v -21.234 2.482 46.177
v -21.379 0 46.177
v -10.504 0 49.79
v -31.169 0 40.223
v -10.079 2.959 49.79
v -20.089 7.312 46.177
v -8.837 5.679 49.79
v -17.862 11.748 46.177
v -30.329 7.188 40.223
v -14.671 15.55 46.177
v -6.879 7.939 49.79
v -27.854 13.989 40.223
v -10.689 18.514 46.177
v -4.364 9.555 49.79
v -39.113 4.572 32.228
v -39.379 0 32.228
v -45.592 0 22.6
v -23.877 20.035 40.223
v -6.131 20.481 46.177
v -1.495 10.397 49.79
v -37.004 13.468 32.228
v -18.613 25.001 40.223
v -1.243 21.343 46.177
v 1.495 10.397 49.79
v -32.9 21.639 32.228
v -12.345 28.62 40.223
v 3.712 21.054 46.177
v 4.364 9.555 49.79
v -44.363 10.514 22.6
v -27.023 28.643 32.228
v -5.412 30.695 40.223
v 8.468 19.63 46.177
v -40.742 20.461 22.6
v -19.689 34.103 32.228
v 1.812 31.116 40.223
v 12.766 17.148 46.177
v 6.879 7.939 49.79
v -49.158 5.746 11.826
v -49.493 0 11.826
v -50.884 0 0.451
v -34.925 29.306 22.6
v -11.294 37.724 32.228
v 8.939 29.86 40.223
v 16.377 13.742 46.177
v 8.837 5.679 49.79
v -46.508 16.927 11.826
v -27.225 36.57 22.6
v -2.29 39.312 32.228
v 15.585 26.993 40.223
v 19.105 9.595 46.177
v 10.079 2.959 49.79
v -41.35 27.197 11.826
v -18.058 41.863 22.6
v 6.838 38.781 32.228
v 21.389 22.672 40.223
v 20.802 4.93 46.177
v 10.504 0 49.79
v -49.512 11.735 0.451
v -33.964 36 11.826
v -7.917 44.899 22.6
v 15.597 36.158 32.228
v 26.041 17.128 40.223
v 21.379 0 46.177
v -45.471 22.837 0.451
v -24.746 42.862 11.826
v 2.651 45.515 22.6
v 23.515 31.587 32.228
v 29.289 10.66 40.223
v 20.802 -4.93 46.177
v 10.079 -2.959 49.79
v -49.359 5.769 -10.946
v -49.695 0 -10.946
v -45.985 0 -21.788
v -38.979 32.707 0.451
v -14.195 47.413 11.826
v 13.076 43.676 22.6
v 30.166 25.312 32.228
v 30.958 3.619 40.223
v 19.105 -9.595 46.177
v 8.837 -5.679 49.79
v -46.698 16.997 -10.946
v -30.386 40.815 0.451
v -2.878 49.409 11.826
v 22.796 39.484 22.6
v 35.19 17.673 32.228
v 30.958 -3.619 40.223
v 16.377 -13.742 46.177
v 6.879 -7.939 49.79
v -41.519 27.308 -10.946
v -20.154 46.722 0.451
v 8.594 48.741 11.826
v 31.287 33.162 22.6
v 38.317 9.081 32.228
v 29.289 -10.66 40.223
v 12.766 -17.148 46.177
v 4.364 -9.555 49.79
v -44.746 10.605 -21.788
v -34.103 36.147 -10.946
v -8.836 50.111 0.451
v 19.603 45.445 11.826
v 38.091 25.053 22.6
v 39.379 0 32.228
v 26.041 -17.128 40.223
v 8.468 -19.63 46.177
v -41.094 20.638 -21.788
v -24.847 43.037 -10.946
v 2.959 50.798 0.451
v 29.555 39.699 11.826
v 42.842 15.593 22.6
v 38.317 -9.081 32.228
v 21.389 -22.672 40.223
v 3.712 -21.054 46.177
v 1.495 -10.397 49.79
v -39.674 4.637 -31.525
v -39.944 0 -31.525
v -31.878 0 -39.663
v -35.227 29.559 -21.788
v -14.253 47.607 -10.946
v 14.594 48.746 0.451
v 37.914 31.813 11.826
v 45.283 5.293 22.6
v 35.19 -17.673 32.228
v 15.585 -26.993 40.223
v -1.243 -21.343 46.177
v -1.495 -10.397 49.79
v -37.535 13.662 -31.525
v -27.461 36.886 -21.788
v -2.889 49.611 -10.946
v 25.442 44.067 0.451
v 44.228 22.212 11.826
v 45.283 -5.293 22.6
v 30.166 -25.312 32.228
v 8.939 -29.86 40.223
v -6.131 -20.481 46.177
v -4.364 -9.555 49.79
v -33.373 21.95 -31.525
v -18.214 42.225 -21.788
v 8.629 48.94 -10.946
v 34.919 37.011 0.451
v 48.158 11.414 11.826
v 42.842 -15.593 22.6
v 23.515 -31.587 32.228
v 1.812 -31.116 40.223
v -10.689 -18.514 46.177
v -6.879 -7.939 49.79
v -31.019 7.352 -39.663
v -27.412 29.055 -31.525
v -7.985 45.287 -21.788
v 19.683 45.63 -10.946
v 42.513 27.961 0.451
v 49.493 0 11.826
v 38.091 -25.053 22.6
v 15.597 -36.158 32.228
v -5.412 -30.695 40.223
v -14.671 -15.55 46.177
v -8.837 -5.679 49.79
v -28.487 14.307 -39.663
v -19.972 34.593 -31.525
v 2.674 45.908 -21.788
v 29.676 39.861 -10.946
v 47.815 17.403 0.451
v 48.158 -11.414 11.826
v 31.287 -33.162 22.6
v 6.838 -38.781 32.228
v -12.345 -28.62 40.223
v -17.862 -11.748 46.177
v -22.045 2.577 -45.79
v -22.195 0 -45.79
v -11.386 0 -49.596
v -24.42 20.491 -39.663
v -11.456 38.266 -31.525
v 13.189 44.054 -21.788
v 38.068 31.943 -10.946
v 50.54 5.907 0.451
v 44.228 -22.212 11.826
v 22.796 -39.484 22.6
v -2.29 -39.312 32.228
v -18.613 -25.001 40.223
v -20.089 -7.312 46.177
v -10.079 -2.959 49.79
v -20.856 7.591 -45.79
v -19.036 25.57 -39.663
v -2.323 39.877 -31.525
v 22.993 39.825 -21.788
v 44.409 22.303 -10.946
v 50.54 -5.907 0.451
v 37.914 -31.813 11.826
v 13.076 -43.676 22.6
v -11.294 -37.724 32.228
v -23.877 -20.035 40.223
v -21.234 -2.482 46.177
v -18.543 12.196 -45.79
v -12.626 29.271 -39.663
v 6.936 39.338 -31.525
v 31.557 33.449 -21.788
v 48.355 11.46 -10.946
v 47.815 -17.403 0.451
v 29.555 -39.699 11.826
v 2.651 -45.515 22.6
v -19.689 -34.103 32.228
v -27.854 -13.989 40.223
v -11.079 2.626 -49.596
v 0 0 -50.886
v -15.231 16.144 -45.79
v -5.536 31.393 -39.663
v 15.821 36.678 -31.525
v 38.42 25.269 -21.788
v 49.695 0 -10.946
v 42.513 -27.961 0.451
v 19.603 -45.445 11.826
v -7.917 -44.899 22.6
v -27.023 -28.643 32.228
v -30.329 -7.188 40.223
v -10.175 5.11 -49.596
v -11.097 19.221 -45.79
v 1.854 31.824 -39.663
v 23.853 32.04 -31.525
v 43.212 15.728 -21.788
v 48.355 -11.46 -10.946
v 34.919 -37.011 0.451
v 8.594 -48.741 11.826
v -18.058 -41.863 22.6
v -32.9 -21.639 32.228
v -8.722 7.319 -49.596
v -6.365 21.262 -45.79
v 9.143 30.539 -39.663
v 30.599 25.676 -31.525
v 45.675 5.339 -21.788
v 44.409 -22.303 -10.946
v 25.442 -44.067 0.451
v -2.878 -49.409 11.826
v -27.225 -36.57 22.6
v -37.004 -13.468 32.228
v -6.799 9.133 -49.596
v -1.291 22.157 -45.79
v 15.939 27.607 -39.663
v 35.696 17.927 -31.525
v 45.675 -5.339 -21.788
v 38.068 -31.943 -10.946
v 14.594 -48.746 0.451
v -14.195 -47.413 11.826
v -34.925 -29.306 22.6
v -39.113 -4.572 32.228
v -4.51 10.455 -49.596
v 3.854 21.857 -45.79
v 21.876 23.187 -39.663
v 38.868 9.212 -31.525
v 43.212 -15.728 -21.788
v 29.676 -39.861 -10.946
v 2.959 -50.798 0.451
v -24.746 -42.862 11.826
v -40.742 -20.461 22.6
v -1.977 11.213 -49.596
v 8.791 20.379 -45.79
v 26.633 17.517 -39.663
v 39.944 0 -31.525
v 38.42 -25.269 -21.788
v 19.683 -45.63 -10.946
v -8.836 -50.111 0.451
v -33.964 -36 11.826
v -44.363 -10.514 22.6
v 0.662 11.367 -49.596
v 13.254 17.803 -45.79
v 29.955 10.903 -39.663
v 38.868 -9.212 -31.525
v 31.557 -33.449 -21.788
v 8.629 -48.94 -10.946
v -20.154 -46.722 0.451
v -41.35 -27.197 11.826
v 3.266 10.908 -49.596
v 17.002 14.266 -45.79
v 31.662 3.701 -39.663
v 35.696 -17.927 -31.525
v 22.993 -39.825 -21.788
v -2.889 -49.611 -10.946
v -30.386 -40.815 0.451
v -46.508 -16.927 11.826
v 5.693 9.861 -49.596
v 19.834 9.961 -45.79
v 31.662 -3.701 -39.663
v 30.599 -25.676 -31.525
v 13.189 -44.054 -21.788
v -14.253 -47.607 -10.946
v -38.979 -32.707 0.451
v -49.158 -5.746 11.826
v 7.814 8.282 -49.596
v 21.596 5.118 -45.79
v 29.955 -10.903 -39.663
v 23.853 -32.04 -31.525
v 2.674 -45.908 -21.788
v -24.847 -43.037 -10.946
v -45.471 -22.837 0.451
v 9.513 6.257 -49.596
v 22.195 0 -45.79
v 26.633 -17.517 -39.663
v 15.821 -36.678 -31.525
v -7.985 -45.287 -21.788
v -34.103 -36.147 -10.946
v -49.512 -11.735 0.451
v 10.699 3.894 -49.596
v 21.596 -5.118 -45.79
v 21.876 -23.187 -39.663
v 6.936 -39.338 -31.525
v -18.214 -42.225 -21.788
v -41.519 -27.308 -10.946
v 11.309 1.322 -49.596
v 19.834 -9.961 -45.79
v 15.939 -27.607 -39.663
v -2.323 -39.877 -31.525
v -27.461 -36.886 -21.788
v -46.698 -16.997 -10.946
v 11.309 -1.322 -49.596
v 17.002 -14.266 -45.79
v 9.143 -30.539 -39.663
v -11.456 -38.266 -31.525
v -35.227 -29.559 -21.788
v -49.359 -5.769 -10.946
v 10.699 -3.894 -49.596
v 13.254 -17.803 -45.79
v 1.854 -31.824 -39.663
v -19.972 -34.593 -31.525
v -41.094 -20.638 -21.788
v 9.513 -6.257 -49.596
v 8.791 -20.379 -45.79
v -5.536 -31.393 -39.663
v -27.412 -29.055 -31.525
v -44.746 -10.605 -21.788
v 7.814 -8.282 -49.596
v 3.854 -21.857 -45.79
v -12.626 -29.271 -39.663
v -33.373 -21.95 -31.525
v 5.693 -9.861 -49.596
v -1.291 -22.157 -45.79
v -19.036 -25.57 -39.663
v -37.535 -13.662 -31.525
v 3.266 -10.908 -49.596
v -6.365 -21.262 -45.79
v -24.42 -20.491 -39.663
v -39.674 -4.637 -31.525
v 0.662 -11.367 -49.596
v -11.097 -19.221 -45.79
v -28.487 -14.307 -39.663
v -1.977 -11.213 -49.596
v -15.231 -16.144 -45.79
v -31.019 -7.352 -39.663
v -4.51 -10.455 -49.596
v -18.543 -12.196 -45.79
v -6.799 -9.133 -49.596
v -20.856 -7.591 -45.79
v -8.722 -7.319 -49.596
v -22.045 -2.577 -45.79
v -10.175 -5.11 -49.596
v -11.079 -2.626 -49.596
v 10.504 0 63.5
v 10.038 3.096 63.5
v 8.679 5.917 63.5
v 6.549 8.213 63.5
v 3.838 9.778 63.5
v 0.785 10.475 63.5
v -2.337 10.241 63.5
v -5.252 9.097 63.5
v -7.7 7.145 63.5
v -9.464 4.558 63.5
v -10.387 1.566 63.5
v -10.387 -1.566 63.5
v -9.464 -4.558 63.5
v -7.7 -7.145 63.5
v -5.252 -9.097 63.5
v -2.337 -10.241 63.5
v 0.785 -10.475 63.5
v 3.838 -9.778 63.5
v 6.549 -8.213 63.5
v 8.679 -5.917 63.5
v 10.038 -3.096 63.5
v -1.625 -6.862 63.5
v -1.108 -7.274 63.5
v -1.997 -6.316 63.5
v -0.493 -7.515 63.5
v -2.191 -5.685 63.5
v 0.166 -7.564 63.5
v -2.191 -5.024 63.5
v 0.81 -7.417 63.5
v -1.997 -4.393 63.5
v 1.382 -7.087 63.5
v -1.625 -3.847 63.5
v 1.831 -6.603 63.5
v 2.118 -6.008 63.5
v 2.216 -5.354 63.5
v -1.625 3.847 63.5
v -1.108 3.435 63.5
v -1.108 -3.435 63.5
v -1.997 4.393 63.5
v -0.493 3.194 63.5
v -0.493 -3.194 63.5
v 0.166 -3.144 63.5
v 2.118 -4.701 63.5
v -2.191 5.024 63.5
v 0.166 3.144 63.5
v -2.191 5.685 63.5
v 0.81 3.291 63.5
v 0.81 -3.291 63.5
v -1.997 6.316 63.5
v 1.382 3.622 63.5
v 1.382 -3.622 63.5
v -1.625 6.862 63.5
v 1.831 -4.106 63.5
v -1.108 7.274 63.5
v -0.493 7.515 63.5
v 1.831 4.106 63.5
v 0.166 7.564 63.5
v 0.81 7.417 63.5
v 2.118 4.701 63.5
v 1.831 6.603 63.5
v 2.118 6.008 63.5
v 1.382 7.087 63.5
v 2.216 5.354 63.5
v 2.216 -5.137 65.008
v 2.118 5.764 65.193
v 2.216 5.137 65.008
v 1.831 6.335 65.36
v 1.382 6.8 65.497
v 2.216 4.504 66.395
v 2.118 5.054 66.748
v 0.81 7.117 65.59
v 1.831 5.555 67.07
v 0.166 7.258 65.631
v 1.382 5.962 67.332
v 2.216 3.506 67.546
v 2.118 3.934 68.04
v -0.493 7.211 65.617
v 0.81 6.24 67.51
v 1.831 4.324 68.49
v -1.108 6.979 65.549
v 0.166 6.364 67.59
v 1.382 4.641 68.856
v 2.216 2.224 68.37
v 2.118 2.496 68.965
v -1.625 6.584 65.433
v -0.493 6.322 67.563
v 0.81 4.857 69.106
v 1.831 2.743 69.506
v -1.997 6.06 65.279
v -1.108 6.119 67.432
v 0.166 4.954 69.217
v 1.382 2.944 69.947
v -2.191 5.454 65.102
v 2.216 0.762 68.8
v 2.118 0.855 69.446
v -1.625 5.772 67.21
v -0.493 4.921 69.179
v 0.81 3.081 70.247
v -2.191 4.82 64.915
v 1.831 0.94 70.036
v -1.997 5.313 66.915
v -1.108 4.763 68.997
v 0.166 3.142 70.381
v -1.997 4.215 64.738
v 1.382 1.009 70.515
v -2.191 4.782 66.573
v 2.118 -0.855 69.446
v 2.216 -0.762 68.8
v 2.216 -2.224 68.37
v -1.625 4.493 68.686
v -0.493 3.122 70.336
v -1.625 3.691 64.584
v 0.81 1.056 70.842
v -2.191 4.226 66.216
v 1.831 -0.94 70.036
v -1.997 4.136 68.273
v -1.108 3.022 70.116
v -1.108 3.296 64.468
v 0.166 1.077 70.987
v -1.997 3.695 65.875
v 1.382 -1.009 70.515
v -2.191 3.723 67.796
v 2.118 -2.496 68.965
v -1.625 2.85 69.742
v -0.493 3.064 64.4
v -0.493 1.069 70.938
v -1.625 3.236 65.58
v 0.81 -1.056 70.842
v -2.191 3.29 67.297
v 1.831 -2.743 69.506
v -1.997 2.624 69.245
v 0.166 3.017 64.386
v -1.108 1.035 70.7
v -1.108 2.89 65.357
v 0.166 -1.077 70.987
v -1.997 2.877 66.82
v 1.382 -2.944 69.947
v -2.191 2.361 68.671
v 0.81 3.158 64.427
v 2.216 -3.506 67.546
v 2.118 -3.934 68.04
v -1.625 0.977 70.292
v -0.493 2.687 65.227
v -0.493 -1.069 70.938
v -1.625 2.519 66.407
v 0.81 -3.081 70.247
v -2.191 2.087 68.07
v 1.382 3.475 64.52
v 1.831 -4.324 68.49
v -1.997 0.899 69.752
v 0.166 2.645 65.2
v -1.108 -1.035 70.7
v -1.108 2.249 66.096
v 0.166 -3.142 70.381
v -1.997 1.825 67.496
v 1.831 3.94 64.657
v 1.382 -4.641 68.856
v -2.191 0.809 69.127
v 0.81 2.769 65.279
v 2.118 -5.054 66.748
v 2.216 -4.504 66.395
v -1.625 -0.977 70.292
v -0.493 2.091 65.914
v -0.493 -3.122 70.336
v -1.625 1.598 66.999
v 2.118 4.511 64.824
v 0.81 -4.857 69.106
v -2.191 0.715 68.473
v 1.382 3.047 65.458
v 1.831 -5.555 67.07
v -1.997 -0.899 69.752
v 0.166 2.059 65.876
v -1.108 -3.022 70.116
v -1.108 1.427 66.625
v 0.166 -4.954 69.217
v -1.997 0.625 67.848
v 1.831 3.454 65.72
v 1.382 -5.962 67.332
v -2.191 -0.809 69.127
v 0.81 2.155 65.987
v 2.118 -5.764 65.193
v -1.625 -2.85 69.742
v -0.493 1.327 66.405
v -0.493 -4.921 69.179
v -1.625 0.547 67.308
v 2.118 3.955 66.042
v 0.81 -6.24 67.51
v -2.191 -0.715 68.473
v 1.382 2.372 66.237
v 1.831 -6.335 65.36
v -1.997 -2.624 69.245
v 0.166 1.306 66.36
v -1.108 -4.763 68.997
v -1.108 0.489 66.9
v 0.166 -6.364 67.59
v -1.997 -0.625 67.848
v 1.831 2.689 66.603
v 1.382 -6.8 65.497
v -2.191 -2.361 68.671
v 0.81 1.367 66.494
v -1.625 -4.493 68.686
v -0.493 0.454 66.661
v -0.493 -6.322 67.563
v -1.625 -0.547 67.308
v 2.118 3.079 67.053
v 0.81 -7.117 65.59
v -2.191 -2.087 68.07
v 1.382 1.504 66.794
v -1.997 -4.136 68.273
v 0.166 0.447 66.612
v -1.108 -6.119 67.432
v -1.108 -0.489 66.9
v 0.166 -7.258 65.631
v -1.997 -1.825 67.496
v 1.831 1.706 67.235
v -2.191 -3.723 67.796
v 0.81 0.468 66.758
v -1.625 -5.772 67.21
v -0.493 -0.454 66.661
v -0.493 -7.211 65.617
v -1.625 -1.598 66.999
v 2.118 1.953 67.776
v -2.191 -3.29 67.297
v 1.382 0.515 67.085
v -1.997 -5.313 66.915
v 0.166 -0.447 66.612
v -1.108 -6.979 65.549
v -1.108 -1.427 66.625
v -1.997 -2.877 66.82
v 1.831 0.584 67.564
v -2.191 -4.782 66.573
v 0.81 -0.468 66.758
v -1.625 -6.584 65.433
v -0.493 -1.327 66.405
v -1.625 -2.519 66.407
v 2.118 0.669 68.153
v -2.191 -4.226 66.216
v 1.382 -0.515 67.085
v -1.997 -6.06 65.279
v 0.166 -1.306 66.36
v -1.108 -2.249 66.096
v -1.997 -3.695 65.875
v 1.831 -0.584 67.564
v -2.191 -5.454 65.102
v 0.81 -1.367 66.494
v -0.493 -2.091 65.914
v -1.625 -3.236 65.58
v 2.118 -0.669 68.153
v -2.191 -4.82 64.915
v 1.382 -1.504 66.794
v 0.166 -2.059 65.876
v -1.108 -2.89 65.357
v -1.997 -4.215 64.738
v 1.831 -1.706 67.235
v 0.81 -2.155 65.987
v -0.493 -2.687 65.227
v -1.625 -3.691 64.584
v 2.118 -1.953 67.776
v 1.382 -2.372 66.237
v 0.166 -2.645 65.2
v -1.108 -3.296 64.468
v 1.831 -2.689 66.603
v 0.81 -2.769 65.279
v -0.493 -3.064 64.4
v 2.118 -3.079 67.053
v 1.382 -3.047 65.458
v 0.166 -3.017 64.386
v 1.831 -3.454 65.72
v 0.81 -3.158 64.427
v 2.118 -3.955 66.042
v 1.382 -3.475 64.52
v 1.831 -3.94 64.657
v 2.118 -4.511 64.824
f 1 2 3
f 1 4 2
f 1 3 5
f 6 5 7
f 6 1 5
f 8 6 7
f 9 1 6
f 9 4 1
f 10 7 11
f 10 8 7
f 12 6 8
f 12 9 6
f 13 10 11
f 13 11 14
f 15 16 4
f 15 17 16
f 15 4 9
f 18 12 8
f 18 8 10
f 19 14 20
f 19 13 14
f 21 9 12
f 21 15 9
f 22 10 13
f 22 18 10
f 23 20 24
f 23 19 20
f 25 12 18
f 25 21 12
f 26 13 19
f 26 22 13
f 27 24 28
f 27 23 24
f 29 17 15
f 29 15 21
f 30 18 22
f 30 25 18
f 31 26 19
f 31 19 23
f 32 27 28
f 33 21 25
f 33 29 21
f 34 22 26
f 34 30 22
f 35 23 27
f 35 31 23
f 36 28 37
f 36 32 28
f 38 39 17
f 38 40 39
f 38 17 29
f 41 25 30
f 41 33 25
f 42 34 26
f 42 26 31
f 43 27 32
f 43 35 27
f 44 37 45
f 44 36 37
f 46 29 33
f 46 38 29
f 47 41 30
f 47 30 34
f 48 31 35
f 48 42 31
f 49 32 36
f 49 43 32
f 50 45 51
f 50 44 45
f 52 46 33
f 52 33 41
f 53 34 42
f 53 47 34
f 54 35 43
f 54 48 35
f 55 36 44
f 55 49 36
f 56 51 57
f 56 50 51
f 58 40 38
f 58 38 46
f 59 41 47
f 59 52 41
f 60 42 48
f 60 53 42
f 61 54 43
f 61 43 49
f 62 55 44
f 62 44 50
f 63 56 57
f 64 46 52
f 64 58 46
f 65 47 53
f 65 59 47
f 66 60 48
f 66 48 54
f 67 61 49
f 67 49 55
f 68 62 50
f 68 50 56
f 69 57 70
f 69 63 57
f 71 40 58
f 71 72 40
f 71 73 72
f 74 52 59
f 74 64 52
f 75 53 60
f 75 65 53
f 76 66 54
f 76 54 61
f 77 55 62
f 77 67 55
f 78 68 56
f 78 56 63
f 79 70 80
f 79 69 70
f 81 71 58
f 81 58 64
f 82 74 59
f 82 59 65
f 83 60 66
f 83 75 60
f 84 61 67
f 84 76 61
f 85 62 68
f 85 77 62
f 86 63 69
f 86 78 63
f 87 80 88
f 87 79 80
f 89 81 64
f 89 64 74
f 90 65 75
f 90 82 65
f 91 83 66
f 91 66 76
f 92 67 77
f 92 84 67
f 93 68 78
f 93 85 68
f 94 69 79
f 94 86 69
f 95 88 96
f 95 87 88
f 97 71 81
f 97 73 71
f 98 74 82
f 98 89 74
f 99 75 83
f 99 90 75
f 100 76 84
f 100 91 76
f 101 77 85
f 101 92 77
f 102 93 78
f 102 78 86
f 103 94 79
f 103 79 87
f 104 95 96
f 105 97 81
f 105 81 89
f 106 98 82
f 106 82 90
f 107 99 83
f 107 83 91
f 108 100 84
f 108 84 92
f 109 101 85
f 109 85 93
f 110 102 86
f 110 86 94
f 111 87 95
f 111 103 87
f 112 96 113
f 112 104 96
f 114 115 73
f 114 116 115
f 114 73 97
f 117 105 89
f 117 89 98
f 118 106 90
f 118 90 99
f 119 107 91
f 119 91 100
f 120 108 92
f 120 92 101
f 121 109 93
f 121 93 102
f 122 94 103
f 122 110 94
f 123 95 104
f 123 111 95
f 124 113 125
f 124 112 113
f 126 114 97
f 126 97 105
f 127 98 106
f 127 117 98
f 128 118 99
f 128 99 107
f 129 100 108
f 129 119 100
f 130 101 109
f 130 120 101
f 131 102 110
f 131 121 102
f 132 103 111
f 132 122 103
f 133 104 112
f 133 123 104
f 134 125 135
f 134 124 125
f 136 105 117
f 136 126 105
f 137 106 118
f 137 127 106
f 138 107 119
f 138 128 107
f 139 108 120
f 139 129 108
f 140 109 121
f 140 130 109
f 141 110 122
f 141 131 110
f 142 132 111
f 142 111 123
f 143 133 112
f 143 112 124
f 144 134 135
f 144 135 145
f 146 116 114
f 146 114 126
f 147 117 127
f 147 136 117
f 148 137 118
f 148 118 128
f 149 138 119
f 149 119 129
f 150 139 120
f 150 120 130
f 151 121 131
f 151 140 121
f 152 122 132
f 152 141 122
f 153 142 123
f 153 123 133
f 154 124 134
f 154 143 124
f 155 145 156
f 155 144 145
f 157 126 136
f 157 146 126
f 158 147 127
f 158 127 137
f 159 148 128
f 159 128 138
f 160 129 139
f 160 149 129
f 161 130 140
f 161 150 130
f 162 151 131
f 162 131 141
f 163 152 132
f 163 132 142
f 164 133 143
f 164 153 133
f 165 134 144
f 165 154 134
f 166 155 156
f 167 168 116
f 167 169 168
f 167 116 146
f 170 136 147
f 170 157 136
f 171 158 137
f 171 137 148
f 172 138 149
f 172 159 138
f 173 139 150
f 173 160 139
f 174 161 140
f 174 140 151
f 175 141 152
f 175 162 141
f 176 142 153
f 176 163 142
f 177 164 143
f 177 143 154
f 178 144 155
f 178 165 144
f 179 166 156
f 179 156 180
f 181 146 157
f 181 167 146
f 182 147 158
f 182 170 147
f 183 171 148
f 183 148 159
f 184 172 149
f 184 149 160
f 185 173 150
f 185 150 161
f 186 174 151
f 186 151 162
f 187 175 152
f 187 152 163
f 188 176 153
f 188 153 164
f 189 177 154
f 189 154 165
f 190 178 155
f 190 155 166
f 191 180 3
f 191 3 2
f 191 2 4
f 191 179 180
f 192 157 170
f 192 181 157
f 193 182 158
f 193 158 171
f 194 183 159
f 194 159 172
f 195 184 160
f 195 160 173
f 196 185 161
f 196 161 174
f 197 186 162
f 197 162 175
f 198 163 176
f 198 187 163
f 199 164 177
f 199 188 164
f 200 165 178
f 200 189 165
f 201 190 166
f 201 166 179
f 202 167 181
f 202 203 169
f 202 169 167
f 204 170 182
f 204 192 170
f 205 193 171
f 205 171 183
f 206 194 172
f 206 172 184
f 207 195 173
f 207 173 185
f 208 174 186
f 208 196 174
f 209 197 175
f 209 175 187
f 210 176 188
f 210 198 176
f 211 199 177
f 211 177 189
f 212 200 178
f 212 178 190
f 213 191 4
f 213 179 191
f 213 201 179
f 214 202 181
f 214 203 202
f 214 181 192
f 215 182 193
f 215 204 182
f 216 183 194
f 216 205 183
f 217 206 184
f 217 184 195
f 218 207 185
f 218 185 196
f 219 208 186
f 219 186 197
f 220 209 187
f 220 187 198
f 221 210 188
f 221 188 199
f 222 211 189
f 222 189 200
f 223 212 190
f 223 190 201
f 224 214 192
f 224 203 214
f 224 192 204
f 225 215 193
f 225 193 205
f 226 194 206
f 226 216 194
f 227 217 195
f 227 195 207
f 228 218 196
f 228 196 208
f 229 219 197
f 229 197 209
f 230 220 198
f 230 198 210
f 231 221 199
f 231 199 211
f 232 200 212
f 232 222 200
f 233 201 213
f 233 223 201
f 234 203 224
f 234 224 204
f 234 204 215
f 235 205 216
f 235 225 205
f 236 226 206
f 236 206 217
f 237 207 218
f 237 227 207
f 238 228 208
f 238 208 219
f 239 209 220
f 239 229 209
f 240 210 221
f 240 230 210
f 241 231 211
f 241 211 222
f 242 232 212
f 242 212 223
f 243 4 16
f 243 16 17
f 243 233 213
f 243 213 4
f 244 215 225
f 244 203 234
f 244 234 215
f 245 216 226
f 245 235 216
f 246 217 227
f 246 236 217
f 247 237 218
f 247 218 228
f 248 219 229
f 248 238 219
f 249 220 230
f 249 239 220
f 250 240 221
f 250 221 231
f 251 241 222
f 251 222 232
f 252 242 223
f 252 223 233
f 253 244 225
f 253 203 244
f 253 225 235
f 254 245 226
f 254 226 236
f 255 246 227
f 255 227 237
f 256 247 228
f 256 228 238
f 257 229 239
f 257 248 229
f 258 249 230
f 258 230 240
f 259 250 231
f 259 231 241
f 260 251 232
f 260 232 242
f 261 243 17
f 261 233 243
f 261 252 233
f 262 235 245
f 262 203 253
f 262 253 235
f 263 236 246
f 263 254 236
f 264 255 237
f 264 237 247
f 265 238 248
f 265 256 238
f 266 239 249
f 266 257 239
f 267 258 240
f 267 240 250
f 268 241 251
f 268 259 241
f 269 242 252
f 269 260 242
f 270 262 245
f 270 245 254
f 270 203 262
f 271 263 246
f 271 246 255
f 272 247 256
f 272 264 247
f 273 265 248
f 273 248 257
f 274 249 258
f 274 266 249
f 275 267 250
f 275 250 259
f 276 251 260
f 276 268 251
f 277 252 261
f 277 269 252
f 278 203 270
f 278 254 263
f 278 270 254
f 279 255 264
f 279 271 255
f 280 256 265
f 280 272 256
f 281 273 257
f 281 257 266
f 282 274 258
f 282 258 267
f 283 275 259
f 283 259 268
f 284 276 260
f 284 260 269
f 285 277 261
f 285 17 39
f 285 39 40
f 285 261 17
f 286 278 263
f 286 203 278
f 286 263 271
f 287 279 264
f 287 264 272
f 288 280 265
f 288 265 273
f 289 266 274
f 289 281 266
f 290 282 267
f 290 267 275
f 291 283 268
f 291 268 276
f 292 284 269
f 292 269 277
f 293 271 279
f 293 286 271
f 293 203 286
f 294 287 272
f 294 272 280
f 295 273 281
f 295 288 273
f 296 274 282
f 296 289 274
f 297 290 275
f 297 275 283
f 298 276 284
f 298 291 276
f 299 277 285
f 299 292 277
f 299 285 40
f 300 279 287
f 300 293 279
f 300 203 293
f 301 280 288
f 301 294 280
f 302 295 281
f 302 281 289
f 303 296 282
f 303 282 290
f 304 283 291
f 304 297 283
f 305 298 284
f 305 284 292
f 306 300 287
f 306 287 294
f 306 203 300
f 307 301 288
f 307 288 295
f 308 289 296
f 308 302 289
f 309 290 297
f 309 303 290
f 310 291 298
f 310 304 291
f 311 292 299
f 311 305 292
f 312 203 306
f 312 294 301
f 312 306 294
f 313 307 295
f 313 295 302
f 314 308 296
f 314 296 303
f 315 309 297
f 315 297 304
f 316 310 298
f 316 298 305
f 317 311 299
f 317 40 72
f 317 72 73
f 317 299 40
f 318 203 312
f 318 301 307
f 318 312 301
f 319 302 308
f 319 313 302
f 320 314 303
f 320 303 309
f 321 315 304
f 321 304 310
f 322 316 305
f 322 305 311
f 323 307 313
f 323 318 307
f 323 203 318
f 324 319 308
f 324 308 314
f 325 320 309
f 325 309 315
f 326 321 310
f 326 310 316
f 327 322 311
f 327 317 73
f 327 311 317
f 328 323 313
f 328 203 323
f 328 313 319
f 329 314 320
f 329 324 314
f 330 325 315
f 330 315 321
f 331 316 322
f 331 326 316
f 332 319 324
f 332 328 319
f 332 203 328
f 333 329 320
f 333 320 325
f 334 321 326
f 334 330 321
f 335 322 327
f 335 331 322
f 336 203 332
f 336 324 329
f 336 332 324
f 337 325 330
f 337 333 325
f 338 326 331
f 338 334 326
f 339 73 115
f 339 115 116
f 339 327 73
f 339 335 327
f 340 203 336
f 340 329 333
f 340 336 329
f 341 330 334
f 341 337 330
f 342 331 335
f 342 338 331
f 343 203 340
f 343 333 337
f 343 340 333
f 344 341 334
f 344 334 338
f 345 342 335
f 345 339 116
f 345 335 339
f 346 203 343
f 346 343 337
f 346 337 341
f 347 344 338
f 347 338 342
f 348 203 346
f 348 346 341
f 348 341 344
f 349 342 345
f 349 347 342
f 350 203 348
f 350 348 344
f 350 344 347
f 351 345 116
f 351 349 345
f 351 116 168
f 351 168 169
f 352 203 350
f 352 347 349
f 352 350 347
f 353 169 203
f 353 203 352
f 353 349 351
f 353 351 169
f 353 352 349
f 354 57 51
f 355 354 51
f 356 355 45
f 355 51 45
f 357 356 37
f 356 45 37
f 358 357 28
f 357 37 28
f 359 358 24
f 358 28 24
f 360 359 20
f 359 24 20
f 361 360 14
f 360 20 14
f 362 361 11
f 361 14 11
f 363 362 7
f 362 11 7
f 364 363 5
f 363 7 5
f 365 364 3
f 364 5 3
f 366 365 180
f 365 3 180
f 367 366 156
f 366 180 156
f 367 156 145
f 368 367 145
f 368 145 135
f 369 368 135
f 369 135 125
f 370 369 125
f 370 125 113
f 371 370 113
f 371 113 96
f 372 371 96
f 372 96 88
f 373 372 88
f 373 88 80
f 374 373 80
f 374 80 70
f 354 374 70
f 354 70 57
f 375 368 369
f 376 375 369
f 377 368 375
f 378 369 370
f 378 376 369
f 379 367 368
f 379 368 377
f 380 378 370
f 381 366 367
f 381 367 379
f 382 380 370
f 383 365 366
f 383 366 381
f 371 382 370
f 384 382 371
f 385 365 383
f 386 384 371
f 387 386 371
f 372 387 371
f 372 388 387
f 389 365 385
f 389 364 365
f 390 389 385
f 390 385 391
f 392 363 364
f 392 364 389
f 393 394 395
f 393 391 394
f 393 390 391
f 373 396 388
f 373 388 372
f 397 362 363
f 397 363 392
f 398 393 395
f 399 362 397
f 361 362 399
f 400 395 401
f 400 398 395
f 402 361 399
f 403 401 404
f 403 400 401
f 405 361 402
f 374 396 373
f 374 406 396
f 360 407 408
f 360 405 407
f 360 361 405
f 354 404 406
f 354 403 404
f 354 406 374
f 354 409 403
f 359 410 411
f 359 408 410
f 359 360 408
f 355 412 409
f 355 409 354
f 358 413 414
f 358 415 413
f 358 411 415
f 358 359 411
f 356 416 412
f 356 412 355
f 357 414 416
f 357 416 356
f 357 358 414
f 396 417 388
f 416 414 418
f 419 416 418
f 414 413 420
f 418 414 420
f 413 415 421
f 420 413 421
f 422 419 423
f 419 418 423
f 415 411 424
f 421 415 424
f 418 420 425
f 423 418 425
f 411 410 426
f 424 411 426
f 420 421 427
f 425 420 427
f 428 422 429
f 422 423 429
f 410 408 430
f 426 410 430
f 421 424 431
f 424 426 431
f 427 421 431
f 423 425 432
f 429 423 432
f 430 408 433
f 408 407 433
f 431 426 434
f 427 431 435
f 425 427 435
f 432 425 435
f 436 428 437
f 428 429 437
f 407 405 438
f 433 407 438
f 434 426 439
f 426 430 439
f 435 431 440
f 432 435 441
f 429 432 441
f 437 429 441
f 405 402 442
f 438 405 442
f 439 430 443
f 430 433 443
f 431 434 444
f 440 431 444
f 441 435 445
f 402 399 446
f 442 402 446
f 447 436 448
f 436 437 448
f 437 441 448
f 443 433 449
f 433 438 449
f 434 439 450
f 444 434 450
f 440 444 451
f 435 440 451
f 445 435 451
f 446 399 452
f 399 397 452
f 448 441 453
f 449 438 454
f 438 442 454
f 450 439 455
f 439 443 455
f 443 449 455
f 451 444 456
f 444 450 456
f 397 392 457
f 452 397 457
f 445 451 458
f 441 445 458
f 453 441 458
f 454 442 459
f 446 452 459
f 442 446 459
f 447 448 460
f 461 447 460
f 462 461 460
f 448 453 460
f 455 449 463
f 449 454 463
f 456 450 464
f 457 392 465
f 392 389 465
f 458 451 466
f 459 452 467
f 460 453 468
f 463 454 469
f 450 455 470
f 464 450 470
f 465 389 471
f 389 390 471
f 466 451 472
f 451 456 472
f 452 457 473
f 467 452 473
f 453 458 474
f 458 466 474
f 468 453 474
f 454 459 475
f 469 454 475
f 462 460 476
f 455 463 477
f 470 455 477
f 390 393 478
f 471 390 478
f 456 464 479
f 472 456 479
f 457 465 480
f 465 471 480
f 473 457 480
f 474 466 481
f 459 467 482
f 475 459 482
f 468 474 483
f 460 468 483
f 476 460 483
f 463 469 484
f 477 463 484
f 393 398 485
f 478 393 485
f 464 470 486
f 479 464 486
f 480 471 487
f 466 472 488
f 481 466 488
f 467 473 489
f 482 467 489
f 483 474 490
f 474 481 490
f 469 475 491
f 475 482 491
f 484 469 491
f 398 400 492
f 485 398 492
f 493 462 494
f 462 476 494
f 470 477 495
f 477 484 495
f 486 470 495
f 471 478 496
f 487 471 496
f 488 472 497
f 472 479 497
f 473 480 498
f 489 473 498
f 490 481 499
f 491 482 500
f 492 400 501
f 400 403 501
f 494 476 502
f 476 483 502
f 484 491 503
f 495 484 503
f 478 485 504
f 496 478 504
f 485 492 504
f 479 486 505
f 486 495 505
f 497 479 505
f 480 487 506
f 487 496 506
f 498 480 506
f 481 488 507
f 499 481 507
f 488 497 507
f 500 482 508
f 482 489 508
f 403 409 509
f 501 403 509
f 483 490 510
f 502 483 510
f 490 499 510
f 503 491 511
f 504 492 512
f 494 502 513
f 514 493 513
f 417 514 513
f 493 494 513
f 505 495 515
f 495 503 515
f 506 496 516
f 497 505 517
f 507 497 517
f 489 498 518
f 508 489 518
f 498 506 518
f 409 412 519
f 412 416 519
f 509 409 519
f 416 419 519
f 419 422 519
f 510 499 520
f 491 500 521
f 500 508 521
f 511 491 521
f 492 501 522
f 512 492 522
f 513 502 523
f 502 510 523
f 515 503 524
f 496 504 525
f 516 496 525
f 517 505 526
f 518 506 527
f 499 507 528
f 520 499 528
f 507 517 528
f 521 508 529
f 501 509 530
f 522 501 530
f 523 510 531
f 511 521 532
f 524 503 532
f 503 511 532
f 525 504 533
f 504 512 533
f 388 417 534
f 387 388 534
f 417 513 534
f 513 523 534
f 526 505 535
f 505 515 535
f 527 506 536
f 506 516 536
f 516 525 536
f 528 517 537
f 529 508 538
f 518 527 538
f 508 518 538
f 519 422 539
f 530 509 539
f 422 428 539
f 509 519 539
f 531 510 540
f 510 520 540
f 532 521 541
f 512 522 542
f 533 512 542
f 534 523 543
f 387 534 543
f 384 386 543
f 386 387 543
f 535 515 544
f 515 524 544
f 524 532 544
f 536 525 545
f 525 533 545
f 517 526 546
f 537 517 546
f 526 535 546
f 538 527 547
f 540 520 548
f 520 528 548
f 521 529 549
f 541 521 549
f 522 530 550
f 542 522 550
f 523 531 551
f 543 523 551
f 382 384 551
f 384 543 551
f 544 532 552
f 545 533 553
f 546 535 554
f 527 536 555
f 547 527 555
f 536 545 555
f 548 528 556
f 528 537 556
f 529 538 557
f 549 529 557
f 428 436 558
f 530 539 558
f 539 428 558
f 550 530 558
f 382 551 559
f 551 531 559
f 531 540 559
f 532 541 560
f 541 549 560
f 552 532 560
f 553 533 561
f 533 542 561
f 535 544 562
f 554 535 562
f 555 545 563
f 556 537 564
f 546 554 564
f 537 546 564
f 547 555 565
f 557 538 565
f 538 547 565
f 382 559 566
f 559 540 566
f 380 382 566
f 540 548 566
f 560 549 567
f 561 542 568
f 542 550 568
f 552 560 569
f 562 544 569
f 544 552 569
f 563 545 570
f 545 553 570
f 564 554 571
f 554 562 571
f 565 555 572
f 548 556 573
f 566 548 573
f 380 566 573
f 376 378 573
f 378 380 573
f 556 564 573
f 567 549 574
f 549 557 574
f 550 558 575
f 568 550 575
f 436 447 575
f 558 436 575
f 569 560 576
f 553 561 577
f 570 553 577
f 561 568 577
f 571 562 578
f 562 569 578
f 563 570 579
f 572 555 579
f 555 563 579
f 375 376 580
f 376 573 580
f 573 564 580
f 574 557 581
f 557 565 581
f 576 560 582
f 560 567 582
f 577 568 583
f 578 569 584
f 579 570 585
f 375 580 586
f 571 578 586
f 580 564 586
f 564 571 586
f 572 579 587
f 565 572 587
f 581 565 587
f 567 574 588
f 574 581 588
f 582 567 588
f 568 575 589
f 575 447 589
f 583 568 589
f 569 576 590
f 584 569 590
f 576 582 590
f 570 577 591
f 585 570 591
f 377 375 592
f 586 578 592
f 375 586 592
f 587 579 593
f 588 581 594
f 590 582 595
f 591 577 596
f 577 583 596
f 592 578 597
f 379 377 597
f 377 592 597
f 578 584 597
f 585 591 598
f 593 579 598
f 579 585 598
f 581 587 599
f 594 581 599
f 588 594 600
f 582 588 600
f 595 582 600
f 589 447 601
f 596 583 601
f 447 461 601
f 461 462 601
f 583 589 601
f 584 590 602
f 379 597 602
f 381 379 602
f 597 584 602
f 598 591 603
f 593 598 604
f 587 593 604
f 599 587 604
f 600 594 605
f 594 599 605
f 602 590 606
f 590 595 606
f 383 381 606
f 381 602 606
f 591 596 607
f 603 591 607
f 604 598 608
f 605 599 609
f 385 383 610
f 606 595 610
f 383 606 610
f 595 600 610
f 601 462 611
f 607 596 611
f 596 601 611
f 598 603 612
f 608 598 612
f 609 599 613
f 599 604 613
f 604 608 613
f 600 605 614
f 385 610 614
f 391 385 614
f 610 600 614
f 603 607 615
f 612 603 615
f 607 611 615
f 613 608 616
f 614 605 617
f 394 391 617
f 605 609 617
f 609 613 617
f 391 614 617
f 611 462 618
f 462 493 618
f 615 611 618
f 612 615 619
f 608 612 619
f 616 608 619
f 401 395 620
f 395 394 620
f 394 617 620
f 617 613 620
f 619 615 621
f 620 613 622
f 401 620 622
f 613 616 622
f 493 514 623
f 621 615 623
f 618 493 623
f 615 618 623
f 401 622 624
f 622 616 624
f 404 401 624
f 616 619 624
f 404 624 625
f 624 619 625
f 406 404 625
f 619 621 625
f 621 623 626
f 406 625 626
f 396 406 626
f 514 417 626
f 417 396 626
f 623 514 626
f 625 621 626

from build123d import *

# Parameters (mm, degrees)
F2_R     = 10.504242
F3_DEPTH = 63.5
F4_R     = 2.216235


with BuildPart() as f1:
    # F0 (on Front) → F1 (revolve)
    with BuildSketch(Plane.XZ):
        with BuildLine():
            Line((0, -50.88574), (0, 50.88574))
            ThreePointArc((0, 50.88574), (-50.88574, 0), (0, -50.88574))
        make_face()
    revolve(axis=Axis((0, 0, 0), (0, 0, -1)))

    # F2 (on Top) → F3 (join)
    with BuildSketch(Plane.XY):
        Circle(F2_R)
    extrude(amount=F3_DEPTH)

    # F4 (on face) → F5 (revolve)
    with BuildSketch(Plane.XY.offset(63.5)):
        with Locations((0, 5.354275)):
            Circle(F4_R)
    revolve(axis=Axis((-0.112007, 0, 63.5), (1, 0, 0)))


solid = f1.part
